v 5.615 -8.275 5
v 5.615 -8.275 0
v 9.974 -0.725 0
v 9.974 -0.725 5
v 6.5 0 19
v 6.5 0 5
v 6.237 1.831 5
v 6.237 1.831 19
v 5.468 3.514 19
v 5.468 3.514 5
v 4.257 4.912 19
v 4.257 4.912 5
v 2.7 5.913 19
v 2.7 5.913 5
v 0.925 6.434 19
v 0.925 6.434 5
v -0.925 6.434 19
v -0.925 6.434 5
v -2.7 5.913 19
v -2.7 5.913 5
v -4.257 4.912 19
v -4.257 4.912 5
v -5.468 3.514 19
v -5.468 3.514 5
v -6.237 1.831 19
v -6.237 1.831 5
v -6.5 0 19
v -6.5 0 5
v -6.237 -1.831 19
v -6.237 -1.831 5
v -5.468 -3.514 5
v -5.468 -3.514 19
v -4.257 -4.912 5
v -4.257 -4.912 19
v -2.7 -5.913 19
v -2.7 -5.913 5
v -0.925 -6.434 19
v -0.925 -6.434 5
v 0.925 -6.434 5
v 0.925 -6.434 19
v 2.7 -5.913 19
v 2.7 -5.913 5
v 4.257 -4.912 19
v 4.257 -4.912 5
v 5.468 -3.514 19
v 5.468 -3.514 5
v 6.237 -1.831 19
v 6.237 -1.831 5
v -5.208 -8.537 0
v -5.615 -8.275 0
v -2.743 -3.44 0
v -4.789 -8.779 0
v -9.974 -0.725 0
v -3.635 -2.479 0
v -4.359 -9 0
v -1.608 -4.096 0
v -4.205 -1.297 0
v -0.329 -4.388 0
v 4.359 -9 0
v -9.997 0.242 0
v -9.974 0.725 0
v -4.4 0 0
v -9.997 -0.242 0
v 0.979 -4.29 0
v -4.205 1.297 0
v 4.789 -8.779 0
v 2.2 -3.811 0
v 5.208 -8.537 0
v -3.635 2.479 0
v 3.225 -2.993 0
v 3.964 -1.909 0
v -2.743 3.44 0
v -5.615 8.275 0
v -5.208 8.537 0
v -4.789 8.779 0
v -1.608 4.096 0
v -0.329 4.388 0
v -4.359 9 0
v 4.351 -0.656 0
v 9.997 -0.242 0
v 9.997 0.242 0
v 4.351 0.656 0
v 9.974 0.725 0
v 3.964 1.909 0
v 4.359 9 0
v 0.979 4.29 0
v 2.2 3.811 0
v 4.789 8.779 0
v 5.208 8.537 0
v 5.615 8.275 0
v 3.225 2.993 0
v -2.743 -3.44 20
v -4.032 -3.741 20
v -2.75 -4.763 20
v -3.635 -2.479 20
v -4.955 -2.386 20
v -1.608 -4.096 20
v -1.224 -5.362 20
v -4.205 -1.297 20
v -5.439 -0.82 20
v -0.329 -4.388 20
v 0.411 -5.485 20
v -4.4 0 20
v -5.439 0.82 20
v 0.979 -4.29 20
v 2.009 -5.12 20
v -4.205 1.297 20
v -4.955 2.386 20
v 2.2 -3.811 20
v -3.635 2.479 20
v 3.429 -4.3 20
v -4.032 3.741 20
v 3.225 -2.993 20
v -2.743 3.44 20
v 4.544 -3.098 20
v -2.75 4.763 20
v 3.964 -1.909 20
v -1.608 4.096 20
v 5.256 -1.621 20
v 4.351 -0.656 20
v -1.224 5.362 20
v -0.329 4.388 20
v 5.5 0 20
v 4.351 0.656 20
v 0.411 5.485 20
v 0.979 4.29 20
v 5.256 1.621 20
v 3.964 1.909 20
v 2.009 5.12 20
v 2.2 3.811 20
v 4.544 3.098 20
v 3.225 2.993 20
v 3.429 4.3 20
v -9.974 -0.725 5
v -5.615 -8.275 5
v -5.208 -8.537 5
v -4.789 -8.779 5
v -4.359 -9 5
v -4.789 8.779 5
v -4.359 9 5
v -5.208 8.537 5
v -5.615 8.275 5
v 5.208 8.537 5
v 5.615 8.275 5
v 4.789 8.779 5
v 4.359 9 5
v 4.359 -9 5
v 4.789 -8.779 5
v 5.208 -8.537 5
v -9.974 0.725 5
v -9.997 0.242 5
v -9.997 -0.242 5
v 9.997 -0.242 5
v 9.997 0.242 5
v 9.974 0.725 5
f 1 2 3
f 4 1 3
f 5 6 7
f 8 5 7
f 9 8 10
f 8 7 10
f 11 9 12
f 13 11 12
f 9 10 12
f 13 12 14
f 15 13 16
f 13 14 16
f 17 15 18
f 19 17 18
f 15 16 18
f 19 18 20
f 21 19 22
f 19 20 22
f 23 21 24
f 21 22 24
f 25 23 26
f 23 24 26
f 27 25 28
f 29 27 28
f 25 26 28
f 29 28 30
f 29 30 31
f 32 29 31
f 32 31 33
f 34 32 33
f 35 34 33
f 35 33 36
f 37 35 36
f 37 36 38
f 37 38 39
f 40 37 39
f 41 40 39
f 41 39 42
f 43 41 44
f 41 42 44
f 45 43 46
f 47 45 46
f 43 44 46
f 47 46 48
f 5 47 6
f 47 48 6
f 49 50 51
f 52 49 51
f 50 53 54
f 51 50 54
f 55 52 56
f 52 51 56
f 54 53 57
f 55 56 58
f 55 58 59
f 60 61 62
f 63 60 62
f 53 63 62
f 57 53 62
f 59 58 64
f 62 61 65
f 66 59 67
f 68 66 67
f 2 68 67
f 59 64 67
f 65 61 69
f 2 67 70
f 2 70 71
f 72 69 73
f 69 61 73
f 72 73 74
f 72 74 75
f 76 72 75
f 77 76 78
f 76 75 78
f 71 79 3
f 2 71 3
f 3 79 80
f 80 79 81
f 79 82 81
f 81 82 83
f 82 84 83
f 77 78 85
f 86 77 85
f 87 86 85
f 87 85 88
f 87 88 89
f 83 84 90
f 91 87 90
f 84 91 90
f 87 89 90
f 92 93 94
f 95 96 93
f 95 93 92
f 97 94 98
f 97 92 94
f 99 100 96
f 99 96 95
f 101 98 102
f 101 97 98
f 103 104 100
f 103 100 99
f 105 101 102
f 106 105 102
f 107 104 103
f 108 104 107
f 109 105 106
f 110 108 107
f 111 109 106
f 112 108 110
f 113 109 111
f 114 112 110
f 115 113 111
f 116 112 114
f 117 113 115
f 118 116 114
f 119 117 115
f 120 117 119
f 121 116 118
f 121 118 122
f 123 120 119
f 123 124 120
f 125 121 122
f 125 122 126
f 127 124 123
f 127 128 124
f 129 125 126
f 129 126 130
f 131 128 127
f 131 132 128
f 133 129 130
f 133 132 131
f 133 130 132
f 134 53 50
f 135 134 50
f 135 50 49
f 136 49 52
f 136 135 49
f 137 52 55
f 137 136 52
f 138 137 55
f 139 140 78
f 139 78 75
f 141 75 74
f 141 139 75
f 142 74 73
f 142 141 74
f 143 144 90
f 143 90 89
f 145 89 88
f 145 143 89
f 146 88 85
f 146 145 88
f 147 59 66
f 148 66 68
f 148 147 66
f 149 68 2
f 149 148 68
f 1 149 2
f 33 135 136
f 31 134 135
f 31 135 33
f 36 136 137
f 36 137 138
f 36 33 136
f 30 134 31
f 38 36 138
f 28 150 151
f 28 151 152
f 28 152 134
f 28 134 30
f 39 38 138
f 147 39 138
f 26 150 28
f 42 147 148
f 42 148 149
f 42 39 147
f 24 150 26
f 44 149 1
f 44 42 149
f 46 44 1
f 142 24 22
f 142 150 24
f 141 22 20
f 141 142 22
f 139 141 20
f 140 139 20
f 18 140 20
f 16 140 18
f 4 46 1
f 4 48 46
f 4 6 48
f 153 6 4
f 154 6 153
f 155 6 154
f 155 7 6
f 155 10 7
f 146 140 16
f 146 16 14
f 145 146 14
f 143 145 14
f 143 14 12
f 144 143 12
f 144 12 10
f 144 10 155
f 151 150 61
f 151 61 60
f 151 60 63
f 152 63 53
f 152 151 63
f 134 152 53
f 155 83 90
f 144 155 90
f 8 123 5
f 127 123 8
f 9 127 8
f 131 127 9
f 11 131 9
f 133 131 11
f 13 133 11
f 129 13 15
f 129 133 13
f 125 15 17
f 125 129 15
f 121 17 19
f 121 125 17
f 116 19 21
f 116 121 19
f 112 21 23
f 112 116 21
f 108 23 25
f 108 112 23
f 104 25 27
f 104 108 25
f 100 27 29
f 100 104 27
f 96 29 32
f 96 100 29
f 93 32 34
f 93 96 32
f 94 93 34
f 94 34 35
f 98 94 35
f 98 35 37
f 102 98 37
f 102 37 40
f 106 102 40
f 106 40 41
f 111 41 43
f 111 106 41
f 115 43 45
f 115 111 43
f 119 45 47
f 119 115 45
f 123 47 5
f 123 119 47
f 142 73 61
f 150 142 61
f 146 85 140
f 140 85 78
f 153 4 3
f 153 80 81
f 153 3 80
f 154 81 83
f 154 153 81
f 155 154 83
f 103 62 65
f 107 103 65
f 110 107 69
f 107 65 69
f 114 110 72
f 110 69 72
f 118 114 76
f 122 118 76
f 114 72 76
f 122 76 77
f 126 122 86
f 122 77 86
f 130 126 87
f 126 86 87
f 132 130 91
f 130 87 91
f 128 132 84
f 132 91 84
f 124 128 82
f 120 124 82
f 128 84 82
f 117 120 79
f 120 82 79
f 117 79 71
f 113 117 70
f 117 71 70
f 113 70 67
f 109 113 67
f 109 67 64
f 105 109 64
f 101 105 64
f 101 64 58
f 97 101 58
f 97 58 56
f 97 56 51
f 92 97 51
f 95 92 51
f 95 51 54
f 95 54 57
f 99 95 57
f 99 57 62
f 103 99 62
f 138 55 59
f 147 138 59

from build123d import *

# Parameters (mm, degrees)
EXTRUDE_1_DEPTH     = 5
SKETCH_2_R          = 6.5
EXTRUDE_2_DEPTH     = 15
SKETCH_5_OUTSIDE_W  = 29.584
SKETCH_5_OUTSIDE_H  = 26.8
SKETCH_5_OUTSIDE_R  = 10
CUT_EXTRUDE_1_DEPTH = 21.346989949
CHAMFER_1_SIZE      = 1
M10X1_25_1_D        = 8.8


with BuildPart() as part:
    # 草图1 → 凸台-拉伸1 (new body)
    with BuildSketch(Plane.XY):
        Polygon((10.392304845, 0), (5.196152423, 9), (-5.196152423, 9), (-10.392304845, 0), (-5.196152423, -9), (5.196152423, -9), align=None)
    extrude(amount=EXTRUDE_1_DEPTH)

    # 草图2 → 凸台-拉伸2 (add)
    with BuildSketch(Plane.XY.offset(5)):
        Circle(SKETCH_2_R)
    extrude(amount=EXTRUDE_2_DEPTH)

    # 草图5 outside → 切除-拉伸1 (cut, through all)
    with BuildSketch(Plane.XY.offset(5)):
        Rectangle(SKETCH_5_OUTSIDE_W, SKETCH_5_OUTSIDE_H)
        Circle(SKETCH_5_OUTSIDE_R, mode=Mode.SUBTRACT)
    extrude(amount=-CUT_EXTRUDE_1_DEPTH, mode=Mode.SUBTRACT)

    # 倒角1
    chamfer_1_edges = [part.edges().sort_by_distance(p)[0] for p in [
        (-6.5, 0, 20),
    ]]
    chamfer(chamfer_1_edges, length=CHAMFER_1_SIZE)

    # M10x1.25 螺纹孔1 (through all)
    with Locations(Plane.XY.offset(20)):
        with Locations((0, 0)):
            Hole(M10X1_25_1_D / 2)


solid = part.part
